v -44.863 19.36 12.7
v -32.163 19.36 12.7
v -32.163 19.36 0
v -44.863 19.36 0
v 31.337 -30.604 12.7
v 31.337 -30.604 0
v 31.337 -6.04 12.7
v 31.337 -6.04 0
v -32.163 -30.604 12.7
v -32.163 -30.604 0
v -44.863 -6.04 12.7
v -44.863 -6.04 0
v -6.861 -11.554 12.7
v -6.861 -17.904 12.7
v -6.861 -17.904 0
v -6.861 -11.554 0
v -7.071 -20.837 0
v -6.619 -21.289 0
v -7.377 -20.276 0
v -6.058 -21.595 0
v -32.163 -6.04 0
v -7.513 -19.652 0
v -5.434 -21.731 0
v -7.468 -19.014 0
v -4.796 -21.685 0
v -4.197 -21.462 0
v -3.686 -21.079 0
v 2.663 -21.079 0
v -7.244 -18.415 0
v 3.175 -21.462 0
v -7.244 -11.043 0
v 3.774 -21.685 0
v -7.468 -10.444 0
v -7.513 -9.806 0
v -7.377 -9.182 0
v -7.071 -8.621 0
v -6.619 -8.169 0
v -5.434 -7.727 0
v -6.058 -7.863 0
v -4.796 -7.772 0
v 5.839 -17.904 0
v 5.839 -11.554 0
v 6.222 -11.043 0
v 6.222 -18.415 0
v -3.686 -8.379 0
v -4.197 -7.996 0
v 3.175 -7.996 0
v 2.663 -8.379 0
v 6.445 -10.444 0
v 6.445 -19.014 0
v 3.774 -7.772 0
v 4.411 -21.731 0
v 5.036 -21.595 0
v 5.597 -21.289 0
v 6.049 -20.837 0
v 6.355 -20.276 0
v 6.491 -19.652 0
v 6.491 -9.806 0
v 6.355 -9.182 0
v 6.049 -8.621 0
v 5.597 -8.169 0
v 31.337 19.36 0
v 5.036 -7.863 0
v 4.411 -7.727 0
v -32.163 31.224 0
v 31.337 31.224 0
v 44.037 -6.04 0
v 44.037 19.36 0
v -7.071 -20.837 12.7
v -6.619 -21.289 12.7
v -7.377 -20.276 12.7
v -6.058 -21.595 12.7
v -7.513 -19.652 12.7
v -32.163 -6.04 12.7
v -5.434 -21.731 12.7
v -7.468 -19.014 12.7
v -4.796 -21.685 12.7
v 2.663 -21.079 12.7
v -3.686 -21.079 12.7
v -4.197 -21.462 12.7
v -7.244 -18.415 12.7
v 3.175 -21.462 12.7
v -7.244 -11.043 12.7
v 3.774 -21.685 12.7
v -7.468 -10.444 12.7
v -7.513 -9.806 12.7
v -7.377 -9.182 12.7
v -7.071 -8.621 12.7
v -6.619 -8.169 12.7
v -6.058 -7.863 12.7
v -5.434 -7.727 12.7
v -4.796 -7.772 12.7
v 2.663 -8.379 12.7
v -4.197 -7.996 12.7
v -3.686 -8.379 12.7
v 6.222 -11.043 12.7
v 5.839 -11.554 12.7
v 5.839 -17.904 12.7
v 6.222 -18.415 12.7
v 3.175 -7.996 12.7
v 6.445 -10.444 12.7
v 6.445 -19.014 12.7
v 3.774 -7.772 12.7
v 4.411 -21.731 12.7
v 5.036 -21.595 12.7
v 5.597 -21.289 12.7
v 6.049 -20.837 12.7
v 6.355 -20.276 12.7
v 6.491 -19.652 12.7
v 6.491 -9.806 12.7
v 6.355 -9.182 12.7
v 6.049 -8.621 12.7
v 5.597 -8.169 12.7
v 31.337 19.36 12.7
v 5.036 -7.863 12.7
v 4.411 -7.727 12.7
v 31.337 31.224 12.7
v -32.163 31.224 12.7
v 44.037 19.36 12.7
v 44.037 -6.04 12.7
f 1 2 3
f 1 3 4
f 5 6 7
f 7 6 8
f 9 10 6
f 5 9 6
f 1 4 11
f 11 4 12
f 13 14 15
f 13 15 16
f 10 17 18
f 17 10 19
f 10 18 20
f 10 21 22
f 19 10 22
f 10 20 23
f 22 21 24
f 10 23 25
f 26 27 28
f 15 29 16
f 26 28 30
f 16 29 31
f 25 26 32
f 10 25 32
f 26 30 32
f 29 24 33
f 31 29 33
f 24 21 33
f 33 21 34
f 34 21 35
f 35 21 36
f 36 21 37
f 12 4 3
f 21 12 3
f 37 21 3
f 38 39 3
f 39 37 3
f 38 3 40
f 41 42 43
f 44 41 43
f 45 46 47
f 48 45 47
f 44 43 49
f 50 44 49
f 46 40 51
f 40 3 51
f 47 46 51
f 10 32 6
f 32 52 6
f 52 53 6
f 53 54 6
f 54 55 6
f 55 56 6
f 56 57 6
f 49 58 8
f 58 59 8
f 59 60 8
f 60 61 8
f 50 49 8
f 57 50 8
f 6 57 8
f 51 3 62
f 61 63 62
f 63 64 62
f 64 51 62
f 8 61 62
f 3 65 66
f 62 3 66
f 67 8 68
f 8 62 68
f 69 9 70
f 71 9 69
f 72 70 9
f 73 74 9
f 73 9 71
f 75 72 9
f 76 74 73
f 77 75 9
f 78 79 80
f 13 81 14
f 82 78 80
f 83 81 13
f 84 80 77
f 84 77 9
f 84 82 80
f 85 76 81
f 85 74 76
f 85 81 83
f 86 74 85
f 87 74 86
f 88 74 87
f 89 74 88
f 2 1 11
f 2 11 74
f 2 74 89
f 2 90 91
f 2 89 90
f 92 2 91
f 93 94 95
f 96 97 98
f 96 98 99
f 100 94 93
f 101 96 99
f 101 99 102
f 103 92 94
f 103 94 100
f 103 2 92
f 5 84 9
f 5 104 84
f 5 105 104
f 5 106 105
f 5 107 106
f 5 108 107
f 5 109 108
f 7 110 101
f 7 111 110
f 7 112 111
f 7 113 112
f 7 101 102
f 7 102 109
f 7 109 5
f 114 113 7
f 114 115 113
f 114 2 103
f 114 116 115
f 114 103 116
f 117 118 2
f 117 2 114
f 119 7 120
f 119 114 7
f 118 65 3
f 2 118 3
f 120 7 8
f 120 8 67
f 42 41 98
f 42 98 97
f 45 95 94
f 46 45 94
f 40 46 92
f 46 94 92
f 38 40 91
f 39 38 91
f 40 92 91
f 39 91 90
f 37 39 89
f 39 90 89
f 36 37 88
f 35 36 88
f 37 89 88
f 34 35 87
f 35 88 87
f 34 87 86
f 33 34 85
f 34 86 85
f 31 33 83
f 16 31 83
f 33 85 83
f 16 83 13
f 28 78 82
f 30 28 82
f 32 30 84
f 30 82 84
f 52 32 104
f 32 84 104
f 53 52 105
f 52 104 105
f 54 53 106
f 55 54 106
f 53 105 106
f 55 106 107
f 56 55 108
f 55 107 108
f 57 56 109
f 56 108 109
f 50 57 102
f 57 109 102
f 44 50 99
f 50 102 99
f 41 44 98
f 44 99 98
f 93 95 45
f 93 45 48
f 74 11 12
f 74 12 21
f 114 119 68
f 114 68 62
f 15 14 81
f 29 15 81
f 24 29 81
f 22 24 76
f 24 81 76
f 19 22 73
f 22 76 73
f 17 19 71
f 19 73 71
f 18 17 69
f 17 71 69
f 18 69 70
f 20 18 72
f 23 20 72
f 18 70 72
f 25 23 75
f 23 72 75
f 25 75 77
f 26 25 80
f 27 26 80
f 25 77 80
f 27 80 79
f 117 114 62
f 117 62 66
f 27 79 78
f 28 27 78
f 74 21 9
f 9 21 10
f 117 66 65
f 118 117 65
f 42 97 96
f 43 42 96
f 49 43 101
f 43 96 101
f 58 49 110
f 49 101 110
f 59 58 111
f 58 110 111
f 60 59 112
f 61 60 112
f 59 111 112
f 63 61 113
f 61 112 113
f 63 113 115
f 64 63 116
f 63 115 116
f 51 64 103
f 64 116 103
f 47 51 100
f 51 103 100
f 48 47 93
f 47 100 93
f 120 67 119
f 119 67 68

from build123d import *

# Parameters (mm, degrees)
BOSS_EXTRUDE1_DEPTH = 12.7
SKETCH2_R           = 2.24536
SKETCH2_W           = 12.7
SKETCH2_H           = 12.7
CUT_EXTRUDE1_DEPTH  = 57.115223473


with BuildPart() as part:
    # Sketch1 → Boss-Extrude1 (new body)
    with BuildSketch(Plane.XY):
        Polygon((-32.163183971, -6.040112022), (-32.163183971, -30.603981495), (31.336816029, -30.603981495), (31.336816029, -6.040112022), (44.036816029, -6.040112022), (44.036816029, 19.359887978), (31.336816029, 19.359887978), (31.336816029, 31.223757452), (-32.163183971, 31.223757452), (-32.163183971, 19.359887978), (-44.863183971, 19.359887978), (-44.863183971, -6.040112022), align=None)
    extrude(amount=BOSS_EXTRUDE1_DEPTH)

    # Sketch2 → Cut-Extrude1 (cut, through all)
    with BuildSketch(Plane.XY.offset(12.7)):
        with Locations((-5.273629901, -9.966481495)):
            Circle(SKETCH2_R)
        with Locations((-5.273629901, -19.491481495)):
            Circle(SKETCH2_R)
        with Locations((4.251370099, -19.491481495)):
            Circle(SKETCH2_R)
        with Locations((4.251370099, -9.966481495)):
            Circle(SKETCH2_R)
        with Locations((-0.511129901, -14.728981495)):
            Rectangle(SKETCH2_W, SKETCH2_H)
    extrude(amount=-CUT_EXTRUDE1_DEPTH, mode=Mode.SUBTRACT)


solid = part.part
